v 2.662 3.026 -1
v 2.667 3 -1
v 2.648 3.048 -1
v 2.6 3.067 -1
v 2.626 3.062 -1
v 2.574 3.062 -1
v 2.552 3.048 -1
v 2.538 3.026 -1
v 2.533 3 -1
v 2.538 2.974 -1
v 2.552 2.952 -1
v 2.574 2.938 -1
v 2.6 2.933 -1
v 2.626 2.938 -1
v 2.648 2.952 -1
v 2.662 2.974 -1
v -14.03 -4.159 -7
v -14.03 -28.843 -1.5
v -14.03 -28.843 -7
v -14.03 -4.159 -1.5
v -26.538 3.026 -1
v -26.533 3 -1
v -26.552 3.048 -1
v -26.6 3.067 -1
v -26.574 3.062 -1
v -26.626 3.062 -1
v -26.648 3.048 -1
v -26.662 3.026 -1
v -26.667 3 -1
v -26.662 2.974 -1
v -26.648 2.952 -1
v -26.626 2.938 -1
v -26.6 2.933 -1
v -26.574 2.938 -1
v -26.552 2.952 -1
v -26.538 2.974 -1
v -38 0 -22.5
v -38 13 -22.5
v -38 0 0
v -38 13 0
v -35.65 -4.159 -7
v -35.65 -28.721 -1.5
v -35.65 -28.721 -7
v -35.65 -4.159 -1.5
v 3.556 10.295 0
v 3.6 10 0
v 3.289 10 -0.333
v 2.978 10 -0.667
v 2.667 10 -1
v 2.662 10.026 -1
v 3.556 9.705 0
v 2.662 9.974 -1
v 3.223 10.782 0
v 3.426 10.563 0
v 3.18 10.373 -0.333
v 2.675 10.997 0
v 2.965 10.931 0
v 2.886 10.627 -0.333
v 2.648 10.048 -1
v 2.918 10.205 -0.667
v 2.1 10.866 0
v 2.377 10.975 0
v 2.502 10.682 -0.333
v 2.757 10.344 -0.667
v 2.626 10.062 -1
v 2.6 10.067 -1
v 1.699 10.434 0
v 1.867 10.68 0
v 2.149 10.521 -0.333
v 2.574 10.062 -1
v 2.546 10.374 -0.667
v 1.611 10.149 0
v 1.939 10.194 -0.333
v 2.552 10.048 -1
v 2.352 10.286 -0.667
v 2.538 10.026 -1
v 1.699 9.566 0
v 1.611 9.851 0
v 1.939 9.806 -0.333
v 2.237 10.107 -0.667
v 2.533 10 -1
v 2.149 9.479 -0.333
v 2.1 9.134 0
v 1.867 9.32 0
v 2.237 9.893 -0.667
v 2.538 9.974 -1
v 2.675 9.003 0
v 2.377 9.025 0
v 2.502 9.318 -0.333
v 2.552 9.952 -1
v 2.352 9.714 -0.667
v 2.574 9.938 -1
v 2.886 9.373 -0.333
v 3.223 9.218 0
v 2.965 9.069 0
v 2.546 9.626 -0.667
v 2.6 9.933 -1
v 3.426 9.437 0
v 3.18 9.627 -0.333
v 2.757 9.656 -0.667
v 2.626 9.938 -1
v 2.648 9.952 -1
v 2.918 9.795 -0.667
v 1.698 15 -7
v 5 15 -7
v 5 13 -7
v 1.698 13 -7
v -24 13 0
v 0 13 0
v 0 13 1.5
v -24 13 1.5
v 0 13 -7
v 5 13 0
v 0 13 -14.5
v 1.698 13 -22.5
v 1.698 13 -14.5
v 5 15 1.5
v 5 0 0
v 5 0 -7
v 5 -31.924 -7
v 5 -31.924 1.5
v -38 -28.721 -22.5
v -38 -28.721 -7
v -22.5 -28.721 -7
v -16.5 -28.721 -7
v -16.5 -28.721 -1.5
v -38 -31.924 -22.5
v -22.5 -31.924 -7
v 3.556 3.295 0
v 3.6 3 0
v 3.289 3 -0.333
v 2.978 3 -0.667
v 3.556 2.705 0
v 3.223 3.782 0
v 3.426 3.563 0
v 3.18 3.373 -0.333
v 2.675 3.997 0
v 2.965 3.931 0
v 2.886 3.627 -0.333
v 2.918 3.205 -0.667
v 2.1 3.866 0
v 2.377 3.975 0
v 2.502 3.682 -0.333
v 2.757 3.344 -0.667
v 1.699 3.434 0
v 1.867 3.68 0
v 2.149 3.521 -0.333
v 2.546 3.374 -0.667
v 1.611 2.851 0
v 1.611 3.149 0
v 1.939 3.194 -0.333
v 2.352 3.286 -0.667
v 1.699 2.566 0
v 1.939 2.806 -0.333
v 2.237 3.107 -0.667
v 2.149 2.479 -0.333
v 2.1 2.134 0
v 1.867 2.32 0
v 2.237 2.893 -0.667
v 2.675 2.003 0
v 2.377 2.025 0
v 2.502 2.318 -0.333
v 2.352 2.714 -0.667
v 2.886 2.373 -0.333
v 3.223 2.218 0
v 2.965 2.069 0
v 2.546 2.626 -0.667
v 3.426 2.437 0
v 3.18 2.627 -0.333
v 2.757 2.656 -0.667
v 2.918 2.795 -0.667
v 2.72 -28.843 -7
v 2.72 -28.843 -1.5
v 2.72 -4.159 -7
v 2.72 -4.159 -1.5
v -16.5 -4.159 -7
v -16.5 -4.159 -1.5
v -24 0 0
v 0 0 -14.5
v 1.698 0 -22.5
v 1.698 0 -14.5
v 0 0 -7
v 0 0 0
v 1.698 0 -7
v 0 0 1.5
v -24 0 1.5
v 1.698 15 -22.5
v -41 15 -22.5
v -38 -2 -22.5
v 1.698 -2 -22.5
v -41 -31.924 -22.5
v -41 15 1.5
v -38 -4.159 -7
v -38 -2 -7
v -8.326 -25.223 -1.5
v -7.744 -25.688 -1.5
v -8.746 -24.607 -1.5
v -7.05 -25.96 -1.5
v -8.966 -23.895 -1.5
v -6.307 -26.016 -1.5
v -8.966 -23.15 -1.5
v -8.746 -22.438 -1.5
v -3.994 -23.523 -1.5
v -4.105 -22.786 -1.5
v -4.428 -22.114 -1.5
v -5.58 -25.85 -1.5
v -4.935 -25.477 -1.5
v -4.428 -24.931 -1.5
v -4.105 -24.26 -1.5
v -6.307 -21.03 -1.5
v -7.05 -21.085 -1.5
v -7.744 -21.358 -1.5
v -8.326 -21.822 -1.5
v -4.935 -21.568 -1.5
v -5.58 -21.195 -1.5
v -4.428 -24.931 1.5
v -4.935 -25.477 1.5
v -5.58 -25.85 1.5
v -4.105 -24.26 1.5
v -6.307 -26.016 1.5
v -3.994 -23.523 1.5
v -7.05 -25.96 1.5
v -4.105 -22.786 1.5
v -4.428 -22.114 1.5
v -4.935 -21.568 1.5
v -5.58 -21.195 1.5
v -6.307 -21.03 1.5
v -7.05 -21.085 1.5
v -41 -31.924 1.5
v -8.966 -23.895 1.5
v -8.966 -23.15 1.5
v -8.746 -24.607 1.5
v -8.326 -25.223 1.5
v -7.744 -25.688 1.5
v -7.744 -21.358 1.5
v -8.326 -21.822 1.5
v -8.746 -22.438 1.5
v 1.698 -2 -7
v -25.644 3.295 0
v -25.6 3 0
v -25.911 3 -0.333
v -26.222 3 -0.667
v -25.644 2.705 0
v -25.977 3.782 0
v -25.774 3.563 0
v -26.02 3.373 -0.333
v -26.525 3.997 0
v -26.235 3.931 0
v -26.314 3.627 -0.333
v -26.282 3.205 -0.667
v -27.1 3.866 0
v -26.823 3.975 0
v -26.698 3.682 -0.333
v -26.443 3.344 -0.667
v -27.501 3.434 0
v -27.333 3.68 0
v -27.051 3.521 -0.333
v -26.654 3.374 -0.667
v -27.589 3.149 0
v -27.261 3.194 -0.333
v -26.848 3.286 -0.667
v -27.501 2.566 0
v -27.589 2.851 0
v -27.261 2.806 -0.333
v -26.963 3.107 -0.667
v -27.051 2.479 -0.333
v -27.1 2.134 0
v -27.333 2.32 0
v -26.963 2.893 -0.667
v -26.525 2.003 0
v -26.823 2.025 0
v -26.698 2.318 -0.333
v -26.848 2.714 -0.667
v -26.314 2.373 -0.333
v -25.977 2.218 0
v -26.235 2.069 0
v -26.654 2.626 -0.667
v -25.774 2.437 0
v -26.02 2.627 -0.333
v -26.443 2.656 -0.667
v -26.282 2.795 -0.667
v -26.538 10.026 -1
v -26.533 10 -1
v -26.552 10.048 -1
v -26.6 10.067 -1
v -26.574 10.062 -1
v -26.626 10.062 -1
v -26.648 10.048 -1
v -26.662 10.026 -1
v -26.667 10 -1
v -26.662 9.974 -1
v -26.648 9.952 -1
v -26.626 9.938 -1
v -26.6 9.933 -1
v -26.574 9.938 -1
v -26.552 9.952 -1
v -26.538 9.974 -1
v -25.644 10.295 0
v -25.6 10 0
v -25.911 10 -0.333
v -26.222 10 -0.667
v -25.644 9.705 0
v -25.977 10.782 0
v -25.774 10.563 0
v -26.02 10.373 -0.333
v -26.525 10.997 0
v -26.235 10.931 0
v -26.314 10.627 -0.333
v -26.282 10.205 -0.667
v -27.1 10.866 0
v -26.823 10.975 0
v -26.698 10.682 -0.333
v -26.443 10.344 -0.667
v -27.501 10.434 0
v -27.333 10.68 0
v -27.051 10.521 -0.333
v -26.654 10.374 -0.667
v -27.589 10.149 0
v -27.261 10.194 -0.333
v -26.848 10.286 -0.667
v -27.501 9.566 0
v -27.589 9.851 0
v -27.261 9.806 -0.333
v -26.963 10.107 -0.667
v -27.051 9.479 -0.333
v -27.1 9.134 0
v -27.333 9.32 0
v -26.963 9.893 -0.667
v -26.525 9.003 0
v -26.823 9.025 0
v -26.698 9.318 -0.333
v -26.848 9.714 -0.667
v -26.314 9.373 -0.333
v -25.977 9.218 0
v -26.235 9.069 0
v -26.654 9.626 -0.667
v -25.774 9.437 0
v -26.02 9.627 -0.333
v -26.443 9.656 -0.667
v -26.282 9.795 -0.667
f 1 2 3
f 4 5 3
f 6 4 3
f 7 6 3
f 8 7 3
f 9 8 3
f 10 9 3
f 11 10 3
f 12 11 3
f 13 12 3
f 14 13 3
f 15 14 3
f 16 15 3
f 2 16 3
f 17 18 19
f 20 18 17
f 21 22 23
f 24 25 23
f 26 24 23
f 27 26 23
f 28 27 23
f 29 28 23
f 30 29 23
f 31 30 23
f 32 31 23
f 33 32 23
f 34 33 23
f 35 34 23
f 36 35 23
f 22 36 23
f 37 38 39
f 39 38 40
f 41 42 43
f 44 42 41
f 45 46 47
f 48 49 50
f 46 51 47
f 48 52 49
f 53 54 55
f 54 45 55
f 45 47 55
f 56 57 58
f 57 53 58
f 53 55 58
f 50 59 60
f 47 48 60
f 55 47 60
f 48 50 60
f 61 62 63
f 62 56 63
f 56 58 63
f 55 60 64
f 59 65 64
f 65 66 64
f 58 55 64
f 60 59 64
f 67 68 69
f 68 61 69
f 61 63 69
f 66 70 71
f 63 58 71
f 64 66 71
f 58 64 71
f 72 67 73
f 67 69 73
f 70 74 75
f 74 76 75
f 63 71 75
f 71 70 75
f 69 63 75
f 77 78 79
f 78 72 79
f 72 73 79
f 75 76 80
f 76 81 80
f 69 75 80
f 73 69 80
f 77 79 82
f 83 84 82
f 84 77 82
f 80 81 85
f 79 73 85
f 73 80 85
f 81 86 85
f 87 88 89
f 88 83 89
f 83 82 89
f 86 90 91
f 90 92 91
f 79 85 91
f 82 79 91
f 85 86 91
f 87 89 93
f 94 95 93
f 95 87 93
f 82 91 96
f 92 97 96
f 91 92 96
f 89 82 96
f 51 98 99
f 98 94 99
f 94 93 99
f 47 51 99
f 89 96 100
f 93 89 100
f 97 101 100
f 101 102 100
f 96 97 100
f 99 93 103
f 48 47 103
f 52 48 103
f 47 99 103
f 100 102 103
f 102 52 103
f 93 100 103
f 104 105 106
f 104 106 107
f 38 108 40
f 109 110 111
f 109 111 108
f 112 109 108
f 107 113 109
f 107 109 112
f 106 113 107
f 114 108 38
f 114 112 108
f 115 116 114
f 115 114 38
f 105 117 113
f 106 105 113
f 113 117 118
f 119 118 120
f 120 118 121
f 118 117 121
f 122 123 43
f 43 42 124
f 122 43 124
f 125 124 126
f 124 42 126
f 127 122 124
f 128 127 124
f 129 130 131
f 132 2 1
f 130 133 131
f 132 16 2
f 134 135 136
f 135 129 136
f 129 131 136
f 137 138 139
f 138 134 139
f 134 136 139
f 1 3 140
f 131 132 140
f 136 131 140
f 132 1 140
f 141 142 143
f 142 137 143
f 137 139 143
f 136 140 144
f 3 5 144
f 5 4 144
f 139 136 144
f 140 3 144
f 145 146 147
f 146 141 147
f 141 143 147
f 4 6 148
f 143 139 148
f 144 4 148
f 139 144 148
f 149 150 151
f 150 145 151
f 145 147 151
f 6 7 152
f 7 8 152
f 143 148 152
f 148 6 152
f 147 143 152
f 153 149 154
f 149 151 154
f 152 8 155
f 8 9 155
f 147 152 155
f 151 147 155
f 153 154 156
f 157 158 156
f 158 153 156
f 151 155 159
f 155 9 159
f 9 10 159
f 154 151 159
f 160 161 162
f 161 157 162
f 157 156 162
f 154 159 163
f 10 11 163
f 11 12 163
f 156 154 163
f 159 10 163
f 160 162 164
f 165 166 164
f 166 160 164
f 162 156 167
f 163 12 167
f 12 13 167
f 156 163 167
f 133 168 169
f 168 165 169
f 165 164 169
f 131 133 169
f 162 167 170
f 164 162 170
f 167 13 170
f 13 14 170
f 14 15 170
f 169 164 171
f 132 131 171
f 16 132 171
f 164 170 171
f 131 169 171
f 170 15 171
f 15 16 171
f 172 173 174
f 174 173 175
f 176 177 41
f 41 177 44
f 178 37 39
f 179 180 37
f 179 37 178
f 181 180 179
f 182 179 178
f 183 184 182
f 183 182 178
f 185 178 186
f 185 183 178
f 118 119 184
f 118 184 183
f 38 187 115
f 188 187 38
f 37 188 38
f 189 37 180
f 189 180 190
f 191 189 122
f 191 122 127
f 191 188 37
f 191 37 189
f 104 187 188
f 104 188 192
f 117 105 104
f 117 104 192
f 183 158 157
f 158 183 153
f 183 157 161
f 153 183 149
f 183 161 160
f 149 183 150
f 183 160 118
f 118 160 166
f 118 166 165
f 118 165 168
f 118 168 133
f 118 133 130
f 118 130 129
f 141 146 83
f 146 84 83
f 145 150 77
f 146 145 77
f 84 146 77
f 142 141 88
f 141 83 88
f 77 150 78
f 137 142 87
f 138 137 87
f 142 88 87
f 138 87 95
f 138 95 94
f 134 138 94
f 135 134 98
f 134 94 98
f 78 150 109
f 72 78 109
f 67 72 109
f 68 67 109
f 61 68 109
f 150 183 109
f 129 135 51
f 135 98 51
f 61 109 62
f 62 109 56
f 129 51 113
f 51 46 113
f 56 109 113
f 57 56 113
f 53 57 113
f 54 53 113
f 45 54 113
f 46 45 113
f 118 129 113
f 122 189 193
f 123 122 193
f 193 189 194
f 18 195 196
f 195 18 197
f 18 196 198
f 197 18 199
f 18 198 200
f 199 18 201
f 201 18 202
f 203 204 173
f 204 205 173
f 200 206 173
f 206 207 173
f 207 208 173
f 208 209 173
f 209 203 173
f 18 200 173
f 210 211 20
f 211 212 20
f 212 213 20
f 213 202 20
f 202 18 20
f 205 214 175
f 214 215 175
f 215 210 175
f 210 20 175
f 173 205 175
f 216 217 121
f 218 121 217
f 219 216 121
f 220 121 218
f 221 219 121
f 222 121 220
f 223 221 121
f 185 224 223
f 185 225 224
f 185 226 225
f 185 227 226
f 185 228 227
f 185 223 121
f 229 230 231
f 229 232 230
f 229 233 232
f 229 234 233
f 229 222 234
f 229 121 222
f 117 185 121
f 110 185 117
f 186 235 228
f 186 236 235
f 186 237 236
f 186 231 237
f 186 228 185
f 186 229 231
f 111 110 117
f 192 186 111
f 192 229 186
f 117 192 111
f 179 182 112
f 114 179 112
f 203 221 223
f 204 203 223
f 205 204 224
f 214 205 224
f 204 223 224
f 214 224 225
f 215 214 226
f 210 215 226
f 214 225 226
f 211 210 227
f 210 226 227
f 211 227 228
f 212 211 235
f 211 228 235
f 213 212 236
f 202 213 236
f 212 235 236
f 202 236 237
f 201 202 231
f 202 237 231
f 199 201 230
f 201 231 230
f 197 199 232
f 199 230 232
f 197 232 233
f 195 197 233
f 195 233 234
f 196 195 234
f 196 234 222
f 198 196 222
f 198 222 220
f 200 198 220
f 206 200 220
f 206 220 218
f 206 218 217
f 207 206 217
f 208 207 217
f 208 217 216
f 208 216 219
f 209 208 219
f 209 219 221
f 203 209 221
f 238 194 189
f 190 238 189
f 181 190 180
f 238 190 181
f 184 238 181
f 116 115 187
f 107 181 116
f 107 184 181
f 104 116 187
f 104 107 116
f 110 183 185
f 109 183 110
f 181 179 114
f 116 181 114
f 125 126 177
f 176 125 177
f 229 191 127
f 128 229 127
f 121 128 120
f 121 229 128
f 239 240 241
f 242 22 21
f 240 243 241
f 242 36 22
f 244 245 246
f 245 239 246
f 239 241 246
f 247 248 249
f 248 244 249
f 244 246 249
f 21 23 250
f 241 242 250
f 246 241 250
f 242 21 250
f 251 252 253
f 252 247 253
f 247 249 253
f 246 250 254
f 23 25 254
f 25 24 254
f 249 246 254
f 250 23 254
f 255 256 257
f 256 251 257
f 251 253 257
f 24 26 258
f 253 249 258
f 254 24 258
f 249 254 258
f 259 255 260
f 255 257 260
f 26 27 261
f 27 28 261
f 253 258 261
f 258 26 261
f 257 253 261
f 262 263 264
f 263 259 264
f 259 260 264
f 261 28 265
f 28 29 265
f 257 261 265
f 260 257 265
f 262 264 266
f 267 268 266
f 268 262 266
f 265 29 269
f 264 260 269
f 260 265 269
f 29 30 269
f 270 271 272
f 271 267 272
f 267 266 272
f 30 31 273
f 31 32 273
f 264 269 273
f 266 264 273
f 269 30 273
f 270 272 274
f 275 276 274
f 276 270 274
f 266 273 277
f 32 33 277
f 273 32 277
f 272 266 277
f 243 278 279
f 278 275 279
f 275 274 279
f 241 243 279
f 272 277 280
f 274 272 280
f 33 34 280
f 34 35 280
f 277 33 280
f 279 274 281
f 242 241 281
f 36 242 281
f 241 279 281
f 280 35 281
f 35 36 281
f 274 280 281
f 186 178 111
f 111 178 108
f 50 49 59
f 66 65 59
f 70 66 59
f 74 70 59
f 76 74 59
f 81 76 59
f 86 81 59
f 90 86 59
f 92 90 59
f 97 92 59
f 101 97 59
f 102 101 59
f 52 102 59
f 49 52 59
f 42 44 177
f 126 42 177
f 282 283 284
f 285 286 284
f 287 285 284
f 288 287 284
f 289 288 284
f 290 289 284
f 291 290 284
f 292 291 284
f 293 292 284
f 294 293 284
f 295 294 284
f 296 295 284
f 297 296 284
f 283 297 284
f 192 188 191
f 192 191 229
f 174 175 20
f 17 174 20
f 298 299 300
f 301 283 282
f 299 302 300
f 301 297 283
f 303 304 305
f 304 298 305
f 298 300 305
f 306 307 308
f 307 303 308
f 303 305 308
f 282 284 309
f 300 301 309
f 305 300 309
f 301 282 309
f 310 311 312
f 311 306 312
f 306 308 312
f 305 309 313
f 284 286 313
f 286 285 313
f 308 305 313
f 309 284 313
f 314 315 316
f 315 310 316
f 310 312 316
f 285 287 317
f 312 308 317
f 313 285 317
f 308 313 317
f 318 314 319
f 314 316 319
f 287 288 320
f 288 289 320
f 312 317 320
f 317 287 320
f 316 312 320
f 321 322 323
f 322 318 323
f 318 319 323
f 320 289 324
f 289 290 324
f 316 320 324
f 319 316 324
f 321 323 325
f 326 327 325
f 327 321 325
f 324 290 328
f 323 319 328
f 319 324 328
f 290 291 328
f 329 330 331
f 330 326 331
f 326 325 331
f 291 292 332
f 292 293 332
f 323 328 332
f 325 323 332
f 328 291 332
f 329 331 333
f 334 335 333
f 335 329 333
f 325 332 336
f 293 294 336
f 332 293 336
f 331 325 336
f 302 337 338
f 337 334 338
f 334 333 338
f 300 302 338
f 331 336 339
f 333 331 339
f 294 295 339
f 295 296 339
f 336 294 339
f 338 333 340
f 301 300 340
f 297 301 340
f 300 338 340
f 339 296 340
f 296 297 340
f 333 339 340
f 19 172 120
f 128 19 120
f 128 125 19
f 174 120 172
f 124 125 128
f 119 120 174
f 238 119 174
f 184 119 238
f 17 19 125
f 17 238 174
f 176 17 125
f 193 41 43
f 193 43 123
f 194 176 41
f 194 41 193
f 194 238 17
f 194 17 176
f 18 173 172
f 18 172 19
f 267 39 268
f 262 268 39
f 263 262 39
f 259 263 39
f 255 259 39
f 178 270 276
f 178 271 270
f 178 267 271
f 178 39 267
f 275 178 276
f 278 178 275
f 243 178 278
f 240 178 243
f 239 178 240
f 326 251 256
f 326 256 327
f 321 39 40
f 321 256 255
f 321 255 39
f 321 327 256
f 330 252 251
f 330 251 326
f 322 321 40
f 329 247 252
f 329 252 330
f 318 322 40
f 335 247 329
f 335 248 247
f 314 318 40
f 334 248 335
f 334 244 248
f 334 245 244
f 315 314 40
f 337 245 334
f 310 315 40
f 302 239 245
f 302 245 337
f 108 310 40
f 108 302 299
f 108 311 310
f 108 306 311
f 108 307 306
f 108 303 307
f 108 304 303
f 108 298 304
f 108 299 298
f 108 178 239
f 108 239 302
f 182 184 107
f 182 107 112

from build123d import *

# Parameters (mm, degrees)
SKETCH_1_W          = 34
SKETCH_1_H          = 17
SKETCH_1_W_2        = 24
SKETCH_1_H_2        = 13
EXTRUDE_1_DEPTH     = 1.5
SKETCH_4_R          = 1
EXTRUDE_4_DEPTH     = 1
EXTRUDE_4_TAPER     = 43
SKETCH_3_W          = 34
SKETCH_3_H          = 2
EXTRUDE_5_DEPTH     = 7
SKETCH_5_W          = 1.698300115
SKETCH_5_H          = 2
SKETCH_5_W_2        = 29
EXTRUDE_6_DEPTH     = 15.5
CUT_EXTRUDE_1_REACH = 7
SKETCH_6_W          = 8
SKETCH_6_H          = 13
EXTRUDE_7_DEPTH     = 12
SKETCH_10_W         = 24
SKETCH_10_H         = 29.92364145
SKETCH_10_W_2       = 22.5
SKETCH_10_H_2       = 13
EXTRUDE_8_DEPTH     = 3
SKETCH_11_W         = 46
SKETCH_11_H         = 29.92364145
EXTRUDE_9_DEPTH     = 3
SKETCH_12_W         = 16.749756905
SKETCH_12_H         = 24.683929902
SKETCH_12_W_2       = 2.349687525
SKETCH_12_H_2       = 24.562319206
EXTRUDE_10_DEPTH    = 5.5
EXTRUDE_START       = -3.202635
EXTRUDE_11_DEPTH    = 3.202635
CUT_EXTRUDE_2_REACH = 26
SKETCH_14_R         = 2.5


with BuildPart() as part:
    # 草图1 → 凸台-拉伸1 (new body)
    with BuildSketch(Plane.XY):
        with Locations((-12, 6.5)):
            Rectangle(SKETCH_1_W, SKETCH_1_H)
        with Locations((-12, 6.5)):
            Rectangle(SKETCH_1_W_2, SKETCH_1_H_2, mode=Mode.SUBTRACT)
    extrude(amount=EXTRUDE_1_DEPTH)

    # 草图4 → 凸台-拉伸4 (add)
    with BuildSketch(Plane.XY):
        with Locations((2.6, 10)):
            Circle(SKETCH_4_R)
        with Locations((2.6, 3)):
            Circle(SKETCH_4_R)
        with Locations((-26.6, 10)):
            Circle(SKETCH_4_R)
        with Locations((-26.6, 3)):
            Circle(SKETCH_4_R)
    extrude(amount=-EXTRUDE_4_DEPTH, taper=EXTRUDE_4_TAPER)

    # 草图3 → 凸台-拉伸5 (add)
    with BuildSketch(Plane(origin=(0, 0, 0), x_dir=(-1, 0, 0), z_dir=(0, 0, -1))):
        with Locations((12, -1)):
            Rectangle(SKETCH_3_W, SKETCH_3_H)
        with Locations((12, 14)):
            Rectangle(SKETCH_3_W, SKETCH_3_H)
    extrude(amount=EXTRUDE_5_DEPTH)

    # 草图5 → 凸台-拉伸6 (add)
    with BuildSketch(Plane(origin=(0, 0, -7), x_dir=(-1, 0, 0), z_dir=(0, 0, -1))):
        with Locations((-0.849150058, -1)):
            Rectangle(SKETCH_5_W, SKETCH_5_H)
        with Locations((14.5, -1)):
            Rectangle(SKETCH_5_W_2, SKETCH_5_H)
        Polygon((0, 15), (-1.698300115, 15), (-1.698300115, 0), (0, 0), (0, 13), align=None)
        with Locations((14.5, 14)):
            Rectangle(SKETCH_5_W_2, SKETCH_5_H)
    extrude(amount=EXTRUDE_6_DEPTH)

    # 草图6 → 切除-拉伸1 (cut, up to next)
    with BuildSketch(Plane.ZY, mode=Mode.PRIVATE) as cut_extrude_1_sk1:
        with Locations((-18.5, 6.5)):
            Rectangle(SKETCH_6_W, SKETCH_6_H)
    cut_extrude_1_tool1 = extrude(cut_extrude_1_sk1.sketch, amount=-CUT_EXTRUDE_1_REACH, mode=Mode.PRIVATE) & part.part
    add(cut_extrude_1_tool1.solids().sort_by_distance((0, 6.5, -18.5))[0], mode=Mode.SUBTRACT)

    # 草图9 → 凸台-拉伸7 (add)
    with BuildSketch(Plane.ZY.offset(29)):
        Polygon((-22.5, 15), (1.5, 15), (1.5, -2), (-22.5, -2), (-22.5, 0), (0, 0), (0, 13), (-22.5, 13), align=None)
    extrude(amount=EXTRUDE_7_DEPTH)

    # 草图10 → 凸台-拉伸8 (add)
    with BuildSketch(Plane.ZY.offset(41)):
        with Locations((-10.5, -16.961820725)):
            Rectangle(SKETCH_10_W, SKETCH_10_H)
        with Locations((-11.25, 6.5)):
            Rectangle(SKETCH_10_W_2, SKETCH_10_H_2)
        Polygon((1.5, 15), (-22.5, 15), (-22.5, 13), (0, 13), (0, 0), (-22.5, 0), (-22.5, -2), (1.5, -2), align=None)
    extrude(amount=-EXTRUDE_8_DEPTH)

    # 草图11 → 凸台-拉伸9 (add)
    with BuildSketch(Plane.XY.offset(1.5)):
        with Locations((-18, -16.961820725)):
            Rectangle(SKETCH_11_W, SKETCH_11_H)
    extrude(amount=-EXTRUDE_9_DEPTH)

    # 草图12 → 凸台-拉伸10 (add)
    with BuildSketch(Plane(origin=(0, 0, -1.5), x_dir=(-1, 0, 0), z_dir=(0, 0, -1))):
        Polygon((-5, -2), (-5, -31.92364145), (16.5, -31.92364145), (16.5, -28.721006537), (16.5, -4.158687331), (16.5, -2), align=None)
        with Locations((5.65486472, -16.500652282)):
            Rectangle(SKETCH_12_W, SKETCH_12_H, mode=Mode.SUBTRACT)
        Polygon((16.5, -28.721006537), (16.5, -31.92364145), (38, -31.92364145), (38, -28.721006537), (35.650312475, -28.721006537), align=None)
        with Locations((36.825156237, -16.439846934)):
            Rectangle(SKETCH_12_W_2, SKETCH_12_H_2)
        Polygon((38, -2), (16.5, -2), (16.5, -4.158687331), (35.650312475, -4.158687331), (38, -4.158687331), align=None)
    extrude(amount=EXTRUDE_10_DEPTH)

    # 草图13 → 凸台-拉伸11 (add)
    with BuildSketch(Plane.XZ.offset(31.92364145).offset(EXTRUDE_START)):
        Polygon((-38, -22.5), (-22.5, -7), (-38, -7), align=None)
    extrude(amount=EXTRUDE_11_DEPTH)

    # 草图14 → 切除-拉伸2 (cut, up to next)
    with BuildSketch(Plane.XY.offset(1.5), mode=Mode.PRIVATE) as cut_extrude_2_sk1:
        with Locations((-6.493645673, -23.522660126)):
            Circle(SKETCH_14_R)
    cut_extrude_2_tool1 = extrude(cut_extrude_2_sk1.sketch, amount=-CUT_EXTRUDE_2_REACH, mode=Mode.PRIVATE) & part.part
    add(cut_extrude_2_tool1.solids().sort_by_distance((-6.493646, -23.52266, 1.5))[0], mode=Mode.SUBTRACT)


solid = part.part
